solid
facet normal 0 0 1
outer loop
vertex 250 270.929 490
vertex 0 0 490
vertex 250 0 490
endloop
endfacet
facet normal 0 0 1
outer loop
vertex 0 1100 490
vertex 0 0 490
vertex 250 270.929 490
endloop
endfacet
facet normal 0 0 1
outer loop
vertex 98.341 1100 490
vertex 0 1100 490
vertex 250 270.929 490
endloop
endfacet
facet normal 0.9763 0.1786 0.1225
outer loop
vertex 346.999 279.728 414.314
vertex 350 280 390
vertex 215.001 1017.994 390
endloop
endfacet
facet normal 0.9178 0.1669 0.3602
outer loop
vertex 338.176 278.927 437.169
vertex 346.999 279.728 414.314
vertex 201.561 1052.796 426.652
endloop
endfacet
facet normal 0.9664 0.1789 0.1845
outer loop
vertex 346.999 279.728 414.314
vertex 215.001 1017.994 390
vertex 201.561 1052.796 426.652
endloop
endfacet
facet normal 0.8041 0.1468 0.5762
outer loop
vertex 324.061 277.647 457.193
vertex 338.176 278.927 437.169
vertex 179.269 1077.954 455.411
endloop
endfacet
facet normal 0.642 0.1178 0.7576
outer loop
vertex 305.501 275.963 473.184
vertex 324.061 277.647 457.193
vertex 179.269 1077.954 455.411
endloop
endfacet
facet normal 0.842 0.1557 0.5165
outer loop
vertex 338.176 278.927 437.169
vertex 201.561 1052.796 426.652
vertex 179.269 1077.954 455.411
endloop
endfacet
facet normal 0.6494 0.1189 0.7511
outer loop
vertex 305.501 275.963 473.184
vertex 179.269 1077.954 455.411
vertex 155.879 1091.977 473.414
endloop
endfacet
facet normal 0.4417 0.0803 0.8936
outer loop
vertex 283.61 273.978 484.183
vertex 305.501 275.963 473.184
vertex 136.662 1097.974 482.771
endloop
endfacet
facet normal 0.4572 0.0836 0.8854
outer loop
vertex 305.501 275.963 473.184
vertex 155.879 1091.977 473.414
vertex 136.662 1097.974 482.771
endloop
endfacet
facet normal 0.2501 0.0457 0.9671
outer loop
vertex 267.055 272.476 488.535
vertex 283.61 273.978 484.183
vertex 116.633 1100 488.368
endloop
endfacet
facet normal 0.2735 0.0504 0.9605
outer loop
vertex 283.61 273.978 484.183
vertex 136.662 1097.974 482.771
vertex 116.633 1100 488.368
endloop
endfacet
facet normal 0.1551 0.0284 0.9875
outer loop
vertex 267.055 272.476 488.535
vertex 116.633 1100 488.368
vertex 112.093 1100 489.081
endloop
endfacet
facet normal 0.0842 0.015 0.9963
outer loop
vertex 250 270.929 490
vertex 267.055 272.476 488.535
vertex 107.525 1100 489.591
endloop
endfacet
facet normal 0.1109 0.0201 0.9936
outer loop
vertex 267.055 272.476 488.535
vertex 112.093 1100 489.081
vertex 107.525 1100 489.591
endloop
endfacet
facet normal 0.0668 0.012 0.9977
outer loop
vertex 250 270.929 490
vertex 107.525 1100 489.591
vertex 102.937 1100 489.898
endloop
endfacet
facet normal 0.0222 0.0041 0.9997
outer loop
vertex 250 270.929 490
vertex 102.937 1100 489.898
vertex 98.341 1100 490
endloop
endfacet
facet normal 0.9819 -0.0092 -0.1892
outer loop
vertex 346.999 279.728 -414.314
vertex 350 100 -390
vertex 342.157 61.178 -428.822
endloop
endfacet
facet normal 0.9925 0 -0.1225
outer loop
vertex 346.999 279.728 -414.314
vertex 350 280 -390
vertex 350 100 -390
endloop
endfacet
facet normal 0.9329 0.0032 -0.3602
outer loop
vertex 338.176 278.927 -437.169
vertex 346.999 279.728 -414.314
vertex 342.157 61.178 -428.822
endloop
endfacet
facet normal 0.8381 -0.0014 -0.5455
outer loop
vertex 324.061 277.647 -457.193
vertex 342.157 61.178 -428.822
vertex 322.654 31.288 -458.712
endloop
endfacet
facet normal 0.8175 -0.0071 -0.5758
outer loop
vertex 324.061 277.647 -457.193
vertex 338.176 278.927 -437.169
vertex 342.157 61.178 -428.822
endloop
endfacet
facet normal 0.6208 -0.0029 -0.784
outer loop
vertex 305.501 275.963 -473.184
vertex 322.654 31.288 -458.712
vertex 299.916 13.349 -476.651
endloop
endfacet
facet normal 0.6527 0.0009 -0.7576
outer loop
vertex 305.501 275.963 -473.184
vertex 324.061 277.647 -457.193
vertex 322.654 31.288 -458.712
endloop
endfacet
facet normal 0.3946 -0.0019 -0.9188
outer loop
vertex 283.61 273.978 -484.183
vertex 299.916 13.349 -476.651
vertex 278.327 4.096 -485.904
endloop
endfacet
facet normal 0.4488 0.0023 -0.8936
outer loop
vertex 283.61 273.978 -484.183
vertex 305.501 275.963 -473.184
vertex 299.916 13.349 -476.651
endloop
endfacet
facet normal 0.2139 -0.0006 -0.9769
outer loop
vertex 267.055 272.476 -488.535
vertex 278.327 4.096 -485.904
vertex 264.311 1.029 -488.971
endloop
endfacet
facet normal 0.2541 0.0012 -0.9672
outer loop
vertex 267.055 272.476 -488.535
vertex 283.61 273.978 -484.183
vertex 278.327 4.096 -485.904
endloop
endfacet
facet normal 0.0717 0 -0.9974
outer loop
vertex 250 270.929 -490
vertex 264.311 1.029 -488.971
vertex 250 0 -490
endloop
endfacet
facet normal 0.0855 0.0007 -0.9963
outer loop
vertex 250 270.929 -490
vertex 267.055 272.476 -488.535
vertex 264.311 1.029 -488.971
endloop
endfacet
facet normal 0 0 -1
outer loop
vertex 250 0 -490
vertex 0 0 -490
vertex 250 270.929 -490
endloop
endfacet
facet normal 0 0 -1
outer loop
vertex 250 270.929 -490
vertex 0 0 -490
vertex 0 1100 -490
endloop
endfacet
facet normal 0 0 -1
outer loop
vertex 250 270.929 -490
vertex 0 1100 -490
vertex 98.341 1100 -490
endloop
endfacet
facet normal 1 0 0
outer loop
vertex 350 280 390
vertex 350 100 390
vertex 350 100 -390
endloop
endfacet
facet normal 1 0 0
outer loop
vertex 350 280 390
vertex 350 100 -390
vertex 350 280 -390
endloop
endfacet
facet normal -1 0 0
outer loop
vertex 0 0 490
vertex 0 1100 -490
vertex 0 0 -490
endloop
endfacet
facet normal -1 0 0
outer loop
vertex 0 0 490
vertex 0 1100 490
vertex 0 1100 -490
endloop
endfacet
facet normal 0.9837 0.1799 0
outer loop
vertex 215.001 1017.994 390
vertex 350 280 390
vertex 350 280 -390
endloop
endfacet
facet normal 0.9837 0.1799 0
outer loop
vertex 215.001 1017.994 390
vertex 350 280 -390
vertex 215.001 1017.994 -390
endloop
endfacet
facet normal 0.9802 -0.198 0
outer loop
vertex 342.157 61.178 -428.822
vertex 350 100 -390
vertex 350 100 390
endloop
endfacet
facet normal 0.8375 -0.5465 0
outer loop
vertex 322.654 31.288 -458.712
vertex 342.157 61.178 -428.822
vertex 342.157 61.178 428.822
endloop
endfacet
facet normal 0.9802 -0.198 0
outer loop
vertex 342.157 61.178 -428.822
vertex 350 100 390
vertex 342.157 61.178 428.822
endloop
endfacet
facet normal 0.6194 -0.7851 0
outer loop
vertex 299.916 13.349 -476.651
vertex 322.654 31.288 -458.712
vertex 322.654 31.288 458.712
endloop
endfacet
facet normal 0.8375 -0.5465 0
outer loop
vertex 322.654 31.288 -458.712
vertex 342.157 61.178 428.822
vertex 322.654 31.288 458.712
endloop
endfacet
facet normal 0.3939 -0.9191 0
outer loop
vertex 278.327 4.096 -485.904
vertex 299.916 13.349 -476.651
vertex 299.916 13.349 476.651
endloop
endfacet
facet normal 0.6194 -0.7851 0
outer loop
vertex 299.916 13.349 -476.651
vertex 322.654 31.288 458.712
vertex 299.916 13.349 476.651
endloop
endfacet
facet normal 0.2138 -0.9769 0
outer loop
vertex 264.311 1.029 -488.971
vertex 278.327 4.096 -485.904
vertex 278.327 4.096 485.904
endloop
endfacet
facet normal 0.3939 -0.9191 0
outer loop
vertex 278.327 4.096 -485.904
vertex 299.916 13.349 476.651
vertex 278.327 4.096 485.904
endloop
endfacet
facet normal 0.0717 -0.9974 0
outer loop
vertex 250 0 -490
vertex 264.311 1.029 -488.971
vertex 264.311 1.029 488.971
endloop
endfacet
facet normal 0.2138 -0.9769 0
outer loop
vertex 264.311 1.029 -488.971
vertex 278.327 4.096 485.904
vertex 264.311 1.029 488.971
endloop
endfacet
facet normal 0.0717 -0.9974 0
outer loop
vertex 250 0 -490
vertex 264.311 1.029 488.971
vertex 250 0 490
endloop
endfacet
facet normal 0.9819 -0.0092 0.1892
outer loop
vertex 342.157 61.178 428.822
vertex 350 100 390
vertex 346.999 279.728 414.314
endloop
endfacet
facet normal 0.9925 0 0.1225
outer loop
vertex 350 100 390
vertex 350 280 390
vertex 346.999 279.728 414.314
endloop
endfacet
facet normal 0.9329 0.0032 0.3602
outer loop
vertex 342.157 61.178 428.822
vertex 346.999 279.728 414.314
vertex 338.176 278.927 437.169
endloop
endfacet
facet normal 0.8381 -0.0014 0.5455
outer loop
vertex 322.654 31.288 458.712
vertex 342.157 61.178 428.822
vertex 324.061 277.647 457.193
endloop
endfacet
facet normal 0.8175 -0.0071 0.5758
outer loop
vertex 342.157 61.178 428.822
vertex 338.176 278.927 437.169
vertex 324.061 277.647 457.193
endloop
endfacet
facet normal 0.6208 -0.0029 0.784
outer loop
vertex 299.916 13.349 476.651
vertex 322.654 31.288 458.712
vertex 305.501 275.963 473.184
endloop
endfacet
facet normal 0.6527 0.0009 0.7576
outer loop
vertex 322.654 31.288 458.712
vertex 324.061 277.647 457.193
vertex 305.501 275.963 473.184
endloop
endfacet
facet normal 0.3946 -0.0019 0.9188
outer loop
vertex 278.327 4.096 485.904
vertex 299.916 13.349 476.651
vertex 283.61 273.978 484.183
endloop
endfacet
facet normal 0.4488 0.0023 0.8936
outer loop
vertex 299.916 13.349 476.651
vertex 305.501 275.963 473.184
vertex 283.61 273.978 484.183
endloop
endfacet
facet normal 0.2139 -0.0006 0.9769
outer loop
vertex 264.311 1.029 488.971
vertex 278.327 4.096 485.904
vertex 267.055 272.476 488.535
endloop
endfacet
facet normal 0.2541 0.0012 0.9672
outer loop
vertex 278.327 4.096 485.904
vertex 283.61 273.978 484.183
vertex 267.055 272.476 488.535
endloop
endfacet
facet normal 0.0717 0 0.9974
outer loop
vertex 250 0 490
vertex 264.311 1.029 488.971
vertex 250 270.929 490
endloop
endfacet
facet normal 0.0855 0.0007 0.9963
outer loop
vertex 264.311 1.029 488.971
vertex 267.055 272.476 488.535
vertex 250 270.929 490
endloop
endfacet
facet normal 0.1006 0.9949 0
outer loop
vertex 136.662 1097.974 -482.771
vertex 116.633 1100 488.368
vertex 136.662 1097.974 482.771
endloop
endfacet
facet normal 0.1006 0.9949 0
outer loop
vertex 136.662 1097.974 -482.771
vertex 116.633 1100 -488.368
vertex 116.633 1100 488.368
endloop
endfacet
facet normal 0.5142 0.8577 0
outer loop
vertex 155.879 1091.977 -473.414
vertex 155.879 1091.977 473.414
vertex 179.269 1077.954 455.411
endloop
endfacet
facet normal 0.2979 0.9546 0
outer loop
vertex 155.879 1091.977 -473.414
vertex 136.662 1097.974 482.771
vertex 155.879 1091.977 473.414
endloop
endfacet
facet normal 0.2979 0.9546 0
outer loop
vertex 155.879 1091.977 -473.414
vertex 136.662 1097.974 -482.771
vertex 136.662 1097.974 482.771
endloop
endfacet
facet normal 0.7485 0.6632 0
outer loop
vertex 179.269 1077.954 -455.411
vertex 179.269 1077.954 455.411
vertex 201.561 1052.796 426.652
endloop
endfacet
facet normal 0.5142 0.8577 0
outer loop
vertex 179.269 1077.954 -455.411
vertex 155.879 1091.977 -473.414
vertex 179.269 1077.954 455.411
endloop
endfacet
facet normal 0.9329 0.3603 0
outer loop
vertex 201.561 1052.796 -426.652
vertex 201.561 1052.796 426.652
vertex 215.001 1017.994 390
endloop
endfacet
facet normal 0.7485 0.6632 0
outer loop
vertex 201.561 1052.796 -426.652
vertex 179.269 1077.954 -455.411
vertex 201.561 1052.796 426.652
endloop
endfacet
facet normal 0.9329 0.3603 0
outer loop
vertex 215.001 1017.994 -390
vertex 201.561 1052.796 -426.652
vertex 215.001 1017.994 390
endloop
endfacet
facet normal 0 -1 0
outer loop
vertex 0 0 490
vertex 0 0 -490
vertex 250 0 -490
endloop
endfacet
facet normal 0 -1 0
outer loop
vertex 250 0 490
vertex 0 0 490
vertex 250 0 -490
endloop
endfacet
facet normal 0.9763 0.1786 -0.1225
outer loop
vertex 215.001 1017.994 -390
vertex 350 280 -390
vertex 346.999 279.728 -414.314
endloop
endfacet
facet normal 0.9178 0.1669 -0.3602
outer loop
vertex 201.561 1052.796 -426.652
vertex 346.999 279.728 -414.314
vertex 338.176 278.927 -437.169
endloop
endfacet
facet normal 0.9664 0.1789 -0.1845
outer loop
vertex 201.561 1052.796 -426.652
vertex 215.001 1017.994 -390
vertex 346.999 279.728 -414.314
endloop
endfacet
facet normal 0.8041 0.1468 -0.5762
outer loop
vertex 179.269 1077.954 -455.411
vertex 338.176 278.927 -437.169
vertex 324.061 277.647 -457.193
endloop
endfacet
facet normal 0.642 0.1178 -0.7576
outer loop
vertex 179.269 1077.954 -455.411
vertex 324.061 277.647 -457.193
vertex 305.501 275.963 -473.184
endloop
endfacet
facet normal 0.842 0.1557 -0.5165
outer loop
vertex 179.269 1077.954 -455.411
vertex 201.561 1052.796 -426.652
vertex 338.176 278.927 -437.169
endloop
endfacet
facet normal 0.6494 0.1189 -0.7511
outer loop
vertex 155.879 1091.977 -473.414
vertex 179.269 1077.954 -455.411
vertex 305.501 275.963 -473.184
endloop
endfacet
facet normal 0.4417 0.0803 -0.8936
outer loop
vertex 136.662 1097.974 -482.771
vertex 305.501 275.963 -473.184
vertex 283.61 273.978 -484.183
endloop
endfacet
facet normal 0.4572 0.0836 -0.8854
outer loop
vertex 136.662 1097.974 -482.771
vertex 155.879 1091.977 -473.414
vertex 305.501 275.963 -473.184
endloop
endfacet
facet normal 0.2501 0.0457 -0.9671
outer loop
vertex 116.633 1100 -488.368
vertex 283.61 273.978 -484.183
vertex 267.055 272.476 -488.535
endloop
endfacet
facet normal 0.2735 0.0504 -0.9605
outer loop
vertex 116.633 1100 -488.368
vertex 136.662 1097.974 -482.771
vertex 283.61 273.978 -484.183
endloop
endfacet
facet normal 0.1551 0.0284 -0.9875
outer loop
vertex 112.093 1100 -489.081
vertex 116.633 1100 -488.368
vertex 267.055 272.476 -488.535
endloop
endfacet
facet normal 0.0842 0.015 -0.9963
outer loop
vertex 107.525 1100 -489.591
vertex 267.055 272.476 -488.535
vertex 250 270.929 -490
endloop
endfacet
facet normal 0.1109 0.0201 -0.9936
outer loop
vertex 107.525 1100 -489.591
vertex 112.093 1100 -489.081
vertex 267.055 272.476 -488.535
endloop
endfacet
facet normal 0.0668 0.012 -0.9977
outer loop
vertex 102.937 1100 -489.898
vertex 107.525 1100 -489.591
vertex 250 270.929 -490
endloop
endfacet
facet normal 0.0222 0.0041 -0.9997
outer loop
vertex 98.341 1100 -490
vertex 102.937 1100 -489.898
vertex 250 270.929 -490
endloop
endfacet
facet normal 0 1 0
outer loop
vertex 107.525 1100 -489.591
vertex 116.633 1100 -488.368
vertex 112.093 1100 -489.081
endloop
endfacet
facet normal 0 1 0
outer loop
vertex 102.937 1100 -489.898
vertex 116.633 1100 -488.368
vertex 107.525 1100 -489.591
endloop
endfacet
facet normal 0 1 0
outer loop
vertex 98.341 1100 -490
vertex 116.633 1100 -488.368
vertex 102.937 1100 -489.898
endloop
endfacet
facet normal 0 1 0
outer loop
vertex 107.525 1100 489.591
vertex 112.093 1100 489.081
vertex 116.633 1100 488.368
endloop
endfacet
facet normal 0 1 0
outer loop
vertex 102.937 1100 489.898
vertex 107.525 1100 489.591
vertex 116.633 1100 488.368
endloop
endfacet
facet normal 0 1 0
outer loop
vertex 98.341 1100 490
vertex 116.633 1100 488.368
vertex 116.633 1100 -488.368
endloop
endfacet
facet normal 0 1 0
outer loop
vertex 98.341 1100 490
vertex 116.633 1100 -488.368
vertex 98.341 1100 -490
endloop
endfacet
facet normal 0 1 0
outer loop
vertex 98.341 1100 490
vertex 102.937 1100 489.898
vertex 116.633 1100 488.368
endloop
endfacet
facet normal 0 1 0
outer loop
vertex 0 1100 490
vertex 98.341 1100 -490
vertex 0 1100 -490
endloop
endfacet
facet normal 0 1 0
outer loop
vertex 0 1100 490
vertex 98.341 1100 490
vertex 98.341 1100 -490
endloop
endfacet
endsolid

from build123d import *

# Parameters (mm, degrees)
BOSS_EXTRUDE1_DEPTH = 490
FILLET1_R           = 100


with BuildPart() as part:
    # Sketch1 → Boss-Extrude1 (new body, symmetric)
    with BuildSketch(Plane.XY):
        Polygon((0, 1100), (0, 0), (350, 0), (350, 280), (200, 1100), align=None)
    extrude(amount=BOSS_EXTRUDE1_DEPTH, both=True)

    # Fillet1
    fillet1_edges = [part.edges().sort_by_distance(p)[0] for p in [
        (350, 140, 490),
        (275, 690, 490),
        (275, 690, -490),
        (350, 140, -490),
        (200, 1100, 0),
        (350, 0, 0),
    ]]
    fillet(fillet1_edges, radius=FILLET1_R)


solid = part.part
